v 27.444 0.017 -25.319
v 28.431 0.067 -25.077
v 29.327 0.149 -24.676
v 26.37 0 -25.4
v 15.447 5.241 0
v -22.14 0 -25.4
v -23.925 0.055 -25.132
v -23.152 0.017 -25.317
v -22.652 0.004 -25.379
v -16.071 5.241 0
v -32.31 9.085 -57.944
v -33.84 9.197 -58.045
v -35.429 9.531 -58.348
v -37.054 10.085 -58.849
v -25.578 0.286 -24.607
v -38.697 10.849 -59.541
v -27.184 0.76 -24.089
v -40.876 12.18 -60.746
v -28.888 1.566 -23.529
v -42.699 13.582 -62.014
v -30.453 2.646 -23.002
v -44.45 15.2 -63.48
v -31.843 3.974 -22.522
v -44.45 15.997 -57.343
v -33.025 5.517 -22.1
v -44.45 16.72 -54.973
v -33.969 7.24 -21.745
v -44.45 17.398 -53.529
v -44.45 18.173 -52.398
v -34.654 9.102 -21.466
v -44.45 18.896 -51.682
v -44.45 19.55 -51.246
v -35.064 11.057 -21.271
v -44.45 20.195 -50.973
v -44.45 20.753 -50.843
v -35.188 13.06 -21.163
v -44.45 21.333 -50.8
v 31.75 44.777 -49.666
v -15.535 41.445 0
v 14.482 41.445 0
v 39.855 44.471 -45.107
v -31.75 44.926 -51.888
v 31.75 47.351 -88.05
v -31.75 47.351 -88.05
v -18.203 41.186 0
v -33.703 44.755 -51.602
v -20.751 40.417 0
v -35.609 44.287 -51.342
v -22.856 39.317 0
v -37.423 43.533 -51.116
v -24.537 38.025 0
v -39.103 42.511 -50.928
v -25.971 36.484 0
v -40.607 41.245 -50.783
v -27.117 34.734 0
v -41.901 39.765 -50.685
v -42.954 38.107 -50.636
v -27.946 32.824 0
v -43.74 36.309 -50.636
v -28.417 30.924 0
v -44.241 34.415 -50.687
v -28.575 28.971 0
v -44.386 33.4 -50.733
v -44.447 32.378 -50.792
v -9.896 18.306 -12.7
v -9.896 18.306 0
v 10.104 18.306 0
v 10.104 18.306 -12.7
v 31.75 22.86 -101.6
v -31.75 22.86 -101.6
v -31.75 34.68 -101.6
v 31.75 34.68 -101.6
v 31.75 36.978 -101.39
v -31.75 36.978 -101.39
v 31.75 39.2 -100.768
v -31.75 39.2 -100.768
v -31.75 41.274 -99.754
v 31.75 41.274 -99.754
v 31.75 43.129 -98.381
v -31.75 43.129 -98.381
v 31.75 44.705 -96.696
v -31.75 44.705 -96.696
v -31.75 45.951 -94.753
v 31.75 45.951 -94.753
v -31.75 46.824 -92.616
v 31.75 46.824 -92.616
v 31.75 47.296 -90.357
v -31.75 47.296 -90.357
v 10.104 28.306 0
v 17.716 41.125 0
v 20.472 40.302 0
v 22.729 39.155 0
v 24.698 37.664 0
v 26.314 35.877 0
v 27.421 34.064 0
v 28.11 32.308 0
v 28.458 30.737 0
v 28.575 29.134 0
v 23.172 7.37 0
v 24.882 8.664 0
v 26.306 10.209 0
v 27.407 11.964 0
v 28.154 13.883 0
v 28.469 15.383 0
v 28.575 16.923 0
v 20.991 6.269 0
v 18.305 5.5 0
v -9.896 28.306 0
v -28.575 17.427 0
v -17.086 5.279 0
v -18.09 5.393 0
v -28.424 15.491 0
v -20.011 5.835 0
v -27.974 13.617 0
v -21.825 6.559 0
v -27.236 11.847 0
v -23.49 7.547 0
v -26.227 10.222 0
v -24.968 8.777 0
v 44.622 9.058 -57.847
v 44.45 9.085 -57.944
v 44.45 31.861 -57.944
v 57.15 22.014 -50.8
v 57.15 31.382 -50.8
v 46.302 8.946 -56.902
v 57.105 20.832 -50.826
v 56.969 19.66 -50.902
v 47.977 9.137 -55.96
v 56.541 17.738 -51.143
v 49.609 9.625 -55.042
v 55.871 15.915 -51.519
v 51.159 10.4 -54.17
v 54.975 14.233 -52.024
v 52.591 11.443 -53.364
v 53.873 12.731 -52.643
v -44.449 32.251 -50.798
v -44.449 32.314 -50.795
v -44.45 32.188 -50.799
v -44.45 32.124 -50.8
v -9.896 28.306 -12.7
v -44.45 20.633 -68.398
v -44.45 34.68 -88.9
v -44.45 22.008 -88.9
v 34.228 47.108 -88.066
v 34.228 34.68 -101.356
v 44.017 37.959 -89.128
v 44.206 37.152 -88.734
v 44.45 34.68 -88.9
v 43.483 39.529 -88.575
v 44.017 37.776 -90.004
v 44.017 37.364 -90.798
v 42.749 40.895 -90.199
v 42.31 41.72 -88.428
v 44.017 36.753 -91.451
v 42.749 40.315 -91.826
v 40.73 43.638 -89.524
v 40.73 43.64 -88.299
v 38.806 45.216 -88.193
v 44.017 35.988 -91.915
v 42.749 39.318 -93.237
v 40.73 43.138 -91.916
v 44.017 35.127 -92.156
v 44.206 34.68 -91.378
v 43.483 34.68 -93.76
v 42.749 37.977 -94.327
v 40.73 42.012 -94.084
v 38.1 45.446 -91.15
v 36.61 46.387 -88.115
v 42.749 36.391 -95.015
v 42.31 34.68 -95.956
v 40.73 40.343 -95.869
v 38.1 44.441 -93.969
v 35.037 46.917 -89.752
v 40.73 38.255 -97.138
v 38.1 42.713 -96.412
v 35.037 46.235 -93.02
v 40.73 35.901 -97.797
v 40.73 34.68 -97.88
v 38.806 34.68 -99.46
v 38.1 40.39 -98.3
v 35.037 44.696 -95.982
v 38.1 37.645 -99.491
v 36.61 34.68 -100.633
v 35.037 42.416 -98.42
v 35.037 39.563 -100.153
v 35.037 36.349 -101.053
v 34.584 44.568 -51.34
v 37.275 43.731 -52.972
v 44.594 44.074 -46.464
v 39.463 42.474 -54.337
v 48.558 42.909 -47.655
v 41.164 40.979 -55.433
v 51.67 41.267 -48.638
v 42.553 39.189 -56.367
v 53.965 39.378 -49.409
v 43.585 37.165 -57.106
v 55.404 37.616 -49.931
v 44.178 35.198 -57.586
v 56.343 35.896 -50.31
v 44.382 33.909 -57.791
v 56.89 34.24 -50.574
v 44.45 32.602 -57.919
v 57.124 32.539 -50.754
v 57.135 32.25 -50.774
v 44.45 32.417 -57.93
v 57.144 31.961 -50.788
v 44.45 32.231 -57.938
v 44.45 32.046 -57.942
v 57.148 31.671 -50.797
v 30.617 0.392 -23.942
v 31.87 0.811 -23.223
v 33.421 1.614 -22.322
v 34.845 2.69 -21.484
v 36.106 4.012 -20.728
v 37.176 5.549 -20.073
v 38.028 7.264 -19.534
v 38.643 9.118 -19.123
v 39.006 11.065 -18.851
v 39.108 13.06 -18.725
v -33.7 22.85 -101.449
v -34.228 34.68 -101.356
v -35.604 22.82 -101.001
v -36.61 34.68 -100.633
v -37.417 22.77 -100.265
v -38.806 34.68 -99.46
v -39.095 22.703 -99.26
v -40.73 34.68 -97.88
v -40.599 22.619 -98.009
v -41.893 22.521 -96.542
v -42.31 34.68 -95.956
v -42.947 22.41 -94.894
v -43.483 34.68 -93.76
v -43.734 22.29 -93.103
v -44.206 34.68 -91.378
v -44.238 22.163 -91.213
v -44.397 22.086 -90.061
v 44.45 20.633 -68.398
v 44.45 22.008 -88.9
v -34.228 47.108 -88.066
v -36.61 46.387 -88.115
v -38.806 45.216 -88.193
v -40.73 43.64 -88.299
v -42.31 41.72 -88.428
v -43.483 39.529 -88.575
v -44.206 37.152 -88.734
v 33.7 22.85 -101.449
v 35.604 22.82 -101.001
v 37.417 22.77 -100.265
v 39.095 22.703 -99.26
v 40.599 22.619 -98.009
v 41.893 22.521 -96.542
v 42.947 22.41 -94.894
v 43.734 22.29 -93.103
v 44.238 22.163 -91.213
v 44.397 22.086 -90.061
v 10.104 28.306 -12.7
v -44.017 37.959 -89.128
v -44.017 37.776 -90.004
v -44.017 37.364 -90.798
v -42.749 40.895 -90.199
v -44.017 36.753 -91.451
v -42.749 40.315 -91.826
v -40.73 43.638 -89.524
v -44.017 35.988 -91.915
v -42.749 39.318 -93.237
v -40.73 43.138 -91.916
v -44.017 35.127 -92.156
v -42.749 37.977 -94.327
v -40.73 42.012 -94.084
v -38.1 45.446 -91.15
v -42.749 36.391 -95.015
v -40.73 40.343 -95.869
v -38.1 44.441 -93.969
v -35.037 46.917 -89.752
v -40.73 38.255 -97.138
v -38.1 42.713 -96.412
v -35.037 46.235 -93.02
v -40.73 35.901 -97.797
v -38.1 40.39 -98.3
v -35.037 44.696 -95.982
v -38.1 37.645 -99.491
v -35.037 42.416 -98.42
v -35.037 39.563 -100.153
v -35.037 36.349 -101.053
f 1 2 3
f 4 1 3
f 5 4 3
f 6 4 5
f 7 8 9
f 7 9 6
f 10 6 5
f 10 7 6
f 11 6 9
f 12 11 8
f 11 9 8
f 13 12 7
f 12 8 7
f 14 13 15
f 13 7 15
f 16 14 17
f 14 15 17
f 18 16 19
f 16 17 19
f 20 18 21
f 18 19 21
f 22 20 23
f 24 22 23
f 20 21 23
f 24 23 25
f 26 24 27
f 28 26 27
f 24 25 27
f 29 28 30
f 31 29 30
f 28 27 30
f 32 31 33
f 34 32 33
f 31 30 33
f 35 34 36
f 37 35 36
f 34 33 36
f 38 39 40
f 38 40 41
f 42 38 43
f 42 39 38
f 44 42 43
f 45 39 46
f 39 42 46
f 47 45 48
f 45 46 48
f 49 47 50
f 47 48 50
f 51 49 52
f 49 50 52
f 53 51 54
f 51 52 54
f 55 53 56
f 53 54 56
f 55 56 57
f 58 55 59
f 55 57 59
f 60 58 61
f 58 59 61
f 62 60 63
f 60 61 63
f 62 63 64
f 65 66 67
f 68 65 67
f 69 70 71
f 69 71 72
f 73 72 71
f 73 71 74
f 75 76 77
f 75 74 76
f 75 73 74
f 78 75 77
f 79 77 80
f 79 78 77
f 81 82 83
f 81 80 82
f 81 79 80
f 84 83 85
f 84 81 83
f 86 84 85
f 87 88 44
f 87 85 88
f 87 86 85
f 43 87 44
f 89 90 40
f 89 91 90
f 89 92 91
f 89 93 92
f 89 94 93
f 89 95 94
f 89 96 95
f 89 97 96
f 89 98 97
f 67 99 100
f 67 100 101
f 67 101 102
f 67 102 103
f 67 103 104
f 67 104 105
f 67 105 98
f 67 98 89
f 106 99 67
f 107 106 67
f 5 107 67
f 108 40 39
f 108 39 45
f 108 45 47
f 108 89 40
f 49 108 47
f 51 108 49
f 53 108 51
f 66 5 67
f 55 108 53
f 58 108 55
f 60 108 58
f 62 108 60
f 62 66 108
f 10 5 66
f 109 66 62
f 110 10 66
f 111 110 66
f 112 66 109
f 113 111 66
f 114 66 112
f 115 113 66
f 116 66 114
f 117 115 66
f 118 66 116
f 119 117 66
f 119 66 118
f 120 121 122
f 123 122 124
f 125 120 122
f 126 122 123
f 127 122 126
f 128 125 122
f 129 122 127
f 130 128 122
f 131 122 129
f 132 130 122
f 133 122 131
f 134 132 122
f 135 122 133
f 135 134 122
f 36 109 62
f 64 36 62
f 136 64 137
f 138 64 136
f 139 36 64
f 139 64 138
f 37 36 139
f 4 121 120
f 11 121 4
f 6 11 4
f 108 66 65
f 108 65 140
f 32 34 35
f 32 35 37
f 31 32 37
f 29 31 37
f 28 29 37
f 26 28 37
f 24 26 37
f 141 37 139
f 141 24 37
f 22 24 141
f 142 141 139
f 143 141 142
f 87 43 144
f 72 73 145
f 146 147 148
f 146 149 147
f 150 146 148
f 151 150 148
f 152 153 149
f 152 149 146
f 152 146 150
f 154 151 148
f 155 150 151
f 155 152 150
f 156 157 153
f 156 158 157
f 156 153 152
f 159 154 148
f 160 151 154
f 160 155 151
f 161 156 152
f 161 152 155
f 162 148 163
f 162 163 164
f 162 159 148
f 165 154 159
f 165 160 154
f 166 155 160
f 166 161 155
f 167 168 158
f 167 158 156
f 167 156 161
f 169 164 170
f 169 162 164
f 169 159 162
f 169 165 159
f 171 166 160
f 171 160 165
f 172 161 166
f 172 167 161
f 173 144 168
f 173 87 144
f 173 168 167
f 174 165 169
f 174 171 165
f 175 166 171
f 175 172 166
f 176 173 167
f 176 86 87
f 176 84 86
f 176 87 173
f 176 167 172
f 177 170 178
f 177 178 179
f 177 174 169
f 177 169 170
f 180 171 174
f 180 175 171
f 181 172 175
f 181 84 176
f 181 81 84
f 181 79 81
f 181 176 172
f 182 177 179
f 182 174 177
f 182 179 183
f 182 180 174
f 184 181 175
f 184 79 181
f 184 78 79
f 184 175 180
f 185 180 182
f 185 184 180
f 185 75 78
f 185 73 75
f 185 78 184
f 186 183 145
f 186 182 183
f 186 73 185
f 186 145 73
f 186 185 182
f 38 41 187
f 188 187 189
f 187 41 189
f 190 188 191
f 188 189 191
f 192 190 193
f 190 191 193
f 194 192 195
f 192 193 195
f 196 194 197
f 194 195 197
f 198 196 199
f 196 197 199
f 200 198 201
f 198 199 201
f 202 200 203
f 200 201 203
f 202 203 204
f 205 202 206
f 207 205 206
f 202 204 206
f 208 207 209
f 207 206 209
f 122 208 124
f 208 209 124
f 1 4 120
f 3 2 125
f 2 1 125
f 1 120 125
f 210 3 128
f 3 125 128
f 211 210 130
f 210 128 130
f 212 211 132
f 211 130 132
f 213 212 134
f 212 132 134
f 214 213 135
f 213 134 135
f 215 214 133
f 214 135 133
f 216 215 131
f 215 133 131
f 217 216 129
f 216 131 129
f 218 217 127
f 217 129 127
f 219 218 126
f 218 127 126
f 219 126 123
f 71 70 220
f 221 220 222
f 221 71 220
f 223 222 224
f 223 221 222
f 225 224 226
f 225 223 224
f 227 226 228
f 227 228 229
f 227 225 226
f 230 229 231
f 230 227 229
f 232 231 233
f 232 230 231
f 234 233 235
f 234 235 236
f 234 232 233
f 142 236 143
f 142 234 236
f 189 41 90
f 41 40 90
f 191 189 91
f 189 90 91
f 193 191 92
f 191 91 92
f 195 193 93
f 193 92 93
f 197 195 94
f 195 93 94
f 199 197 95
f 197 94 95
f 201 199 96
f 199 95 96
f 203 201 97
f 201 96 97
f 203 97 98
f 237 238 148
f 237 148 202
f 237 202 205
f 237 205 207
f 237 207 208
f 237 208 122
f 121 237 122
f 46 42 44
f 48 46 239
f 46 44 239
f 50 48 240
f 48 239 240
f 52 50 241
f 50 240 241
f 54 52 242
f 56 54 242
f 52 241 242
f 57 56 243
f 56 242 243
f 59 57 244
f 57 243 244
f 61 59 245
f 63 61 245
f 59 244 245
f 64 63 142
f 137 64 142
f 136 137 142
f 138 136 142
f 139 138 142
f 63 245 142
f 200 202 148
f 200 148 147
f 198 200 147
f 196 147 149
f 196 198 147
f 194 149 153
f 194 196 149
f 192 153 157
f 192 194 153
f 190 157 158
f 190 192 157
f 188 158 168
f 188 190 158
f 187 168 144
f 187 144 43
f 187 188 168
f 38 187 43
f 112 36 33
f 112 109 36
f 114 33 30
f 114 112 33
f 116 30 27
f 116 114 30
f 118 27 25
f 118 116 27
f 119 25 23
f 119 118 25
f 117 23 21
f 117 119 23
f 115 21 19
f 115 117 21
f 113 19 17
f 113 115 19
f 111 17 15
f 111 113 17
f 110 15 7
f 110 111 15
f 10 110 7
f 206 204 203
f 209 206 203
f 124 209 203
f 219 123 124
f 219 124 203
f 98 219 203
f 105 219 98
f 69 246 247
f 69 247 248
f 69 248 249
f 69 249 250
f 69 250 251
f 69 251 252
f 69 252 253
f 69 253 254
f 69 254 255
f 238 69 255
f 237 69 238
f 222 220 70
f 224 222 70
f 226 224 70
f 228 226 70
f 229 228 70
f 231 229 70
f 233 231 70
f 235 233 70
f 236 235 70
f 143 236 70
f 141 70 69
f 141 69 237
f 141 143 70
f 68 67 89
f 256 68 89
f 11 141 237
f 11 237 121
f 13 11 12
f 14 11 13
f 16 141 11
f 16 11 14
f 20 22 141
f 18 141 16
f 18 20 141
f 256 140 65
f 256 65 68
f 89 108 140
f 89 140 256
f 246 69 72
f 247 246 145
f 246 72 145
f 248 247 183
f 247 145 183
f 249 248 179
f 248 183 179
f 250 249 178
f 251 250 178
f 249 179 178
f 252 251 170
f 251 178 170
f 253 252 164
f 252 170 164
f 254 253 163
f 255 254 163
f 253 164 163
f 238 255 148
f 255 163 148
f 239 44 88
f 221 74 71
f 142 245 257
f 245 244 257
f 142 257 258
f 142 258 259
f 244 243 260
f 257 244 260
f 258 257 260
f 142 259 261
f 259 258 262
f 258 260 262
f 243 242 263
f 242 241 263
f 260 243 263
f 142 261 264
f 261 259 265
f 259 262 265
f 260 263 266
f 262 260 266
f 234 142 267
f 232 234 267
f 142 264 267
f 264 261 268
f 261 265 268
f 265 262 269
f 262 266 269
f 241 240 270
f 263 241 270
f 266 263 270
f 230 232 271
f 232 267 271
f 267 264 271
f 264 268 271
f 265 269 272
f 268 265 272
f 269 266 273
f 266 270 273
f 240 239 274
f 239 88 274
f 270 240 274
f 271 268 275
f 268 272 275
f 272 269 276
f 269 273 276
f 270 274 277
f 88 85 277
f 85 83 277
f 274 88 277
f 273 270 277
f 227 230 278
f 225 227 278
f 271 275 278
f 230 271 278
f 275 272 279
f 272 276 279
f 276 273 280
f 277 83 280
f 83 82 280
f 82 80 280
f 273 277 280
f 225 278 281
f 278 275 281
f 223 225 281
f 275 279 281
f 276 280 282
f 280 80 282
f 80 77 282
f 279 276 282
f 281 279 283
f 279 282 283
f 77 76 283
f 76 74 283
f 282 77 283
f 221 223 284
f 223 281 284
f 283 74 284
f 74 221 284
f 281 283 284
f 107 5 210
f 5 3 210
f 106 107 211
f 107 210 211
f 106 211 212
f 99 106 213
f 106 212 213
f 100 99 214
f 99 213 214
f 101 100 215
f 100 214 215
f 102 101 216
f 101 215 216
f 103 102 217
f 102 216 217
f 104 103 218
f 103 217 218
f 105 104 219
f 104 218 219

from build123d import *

# Parameters (mm, degrees)
EXTRUDE1_DEPTH     = 48.26
SKETCH3_OUTSIDE_W  = 133.914
SKETCH3_OUTSIDE_H  = 80.574
CUT_EXTRUDE1_DEPTH = 127
FILLET1_R          = 12.7
FILLET2_R          = 12.7
SKETCH8_W          = 20
SKETCH8_H          = 10
CUT_EXTRUDE2_DEPTH = 12.7


with BuildPart() as part:
    # Sketch1 → Extrude1 (new body)
    with BuildSketch(Plane(origin=(0, 0, 0), x_dir=(1, 0, 0), z_dir=(0, 1, 0))):
        Polygon((-44.45, 101.6), (44.45, 101.6), (44.45, 57.94375), (57.15, 50.8), (28.575, 0), (-28.575, 0), (-44.45, 50.8), align=None)
    extrude(amount=EXTRUDE1_DEPTH)

    # Sketch3 outside → Cut-Extrude1 (cut, symmetric)
    with BuildSketch(Plane.ZY.offset(44.45)):
        with Locations((-50.8, 24.13)):
            Rectangle(SKETCH3_OUTSIDE_W, SKETCH3_OUTSIDE_H)
        Polygon((0, 41.445288221), (-101.6, 48.26), (-101.6, 22.86), (-68.397585835, 20.632983436), (-57.94375, 9.084619968), (-25.4, 0), (0, 5.240594668), align=None, mode=Mode.SUBTRACT)
    extrude(amount=CUT_EXTRUDE1_DEPTH, both=True, mode=Mode.SUBTRACT)

    # Fillet1
    fillet1_edges = [part.edges().sort_by_distance(p)[0] for p in [
        (-44.45, 35.56, -101.6),
        (44.45, 35.56, -101.6),
        (0, 48.26, -101.6),
        (-44.45, 46.556322055, -76.2),
        (-36.5125, 43.148966165, -25.4),
        (42.8625, 43.148966165, -25.4),
        (50.8, 45.092223821, -54.371875),
        (44.45, 46.795901766, -79.771875),
    ]]
    fillet(fillet1_edges, radius=FILLET1_R)

    # Fillet2
    fillet2_edges = [part.edges().sort_by_distance(p)[0] for p in [
        (-40.48125, 3.545217548, -38.1),
        (-32.54375, 2.620297334, -12.7),
        (50.00625, 3.545217548, -38.1),
        (35.71875, 2.620297334, -12.7),
    ]]
    fillet(fillet2_edges, radius=FILLET2_R)

    # Sketch8 → Cut-Extrude2 (cut)
    with BuildSketch(Plane.XY):
        with Locations((0.104168421, 23.306375587)):
            Rectangle(SKETCH8_W, SKETCH8_H)
    extrude(amount=-CUT_EXTRUDE2_DEPTH, mode=Mode.SUBTRACT)


solid = part.part
